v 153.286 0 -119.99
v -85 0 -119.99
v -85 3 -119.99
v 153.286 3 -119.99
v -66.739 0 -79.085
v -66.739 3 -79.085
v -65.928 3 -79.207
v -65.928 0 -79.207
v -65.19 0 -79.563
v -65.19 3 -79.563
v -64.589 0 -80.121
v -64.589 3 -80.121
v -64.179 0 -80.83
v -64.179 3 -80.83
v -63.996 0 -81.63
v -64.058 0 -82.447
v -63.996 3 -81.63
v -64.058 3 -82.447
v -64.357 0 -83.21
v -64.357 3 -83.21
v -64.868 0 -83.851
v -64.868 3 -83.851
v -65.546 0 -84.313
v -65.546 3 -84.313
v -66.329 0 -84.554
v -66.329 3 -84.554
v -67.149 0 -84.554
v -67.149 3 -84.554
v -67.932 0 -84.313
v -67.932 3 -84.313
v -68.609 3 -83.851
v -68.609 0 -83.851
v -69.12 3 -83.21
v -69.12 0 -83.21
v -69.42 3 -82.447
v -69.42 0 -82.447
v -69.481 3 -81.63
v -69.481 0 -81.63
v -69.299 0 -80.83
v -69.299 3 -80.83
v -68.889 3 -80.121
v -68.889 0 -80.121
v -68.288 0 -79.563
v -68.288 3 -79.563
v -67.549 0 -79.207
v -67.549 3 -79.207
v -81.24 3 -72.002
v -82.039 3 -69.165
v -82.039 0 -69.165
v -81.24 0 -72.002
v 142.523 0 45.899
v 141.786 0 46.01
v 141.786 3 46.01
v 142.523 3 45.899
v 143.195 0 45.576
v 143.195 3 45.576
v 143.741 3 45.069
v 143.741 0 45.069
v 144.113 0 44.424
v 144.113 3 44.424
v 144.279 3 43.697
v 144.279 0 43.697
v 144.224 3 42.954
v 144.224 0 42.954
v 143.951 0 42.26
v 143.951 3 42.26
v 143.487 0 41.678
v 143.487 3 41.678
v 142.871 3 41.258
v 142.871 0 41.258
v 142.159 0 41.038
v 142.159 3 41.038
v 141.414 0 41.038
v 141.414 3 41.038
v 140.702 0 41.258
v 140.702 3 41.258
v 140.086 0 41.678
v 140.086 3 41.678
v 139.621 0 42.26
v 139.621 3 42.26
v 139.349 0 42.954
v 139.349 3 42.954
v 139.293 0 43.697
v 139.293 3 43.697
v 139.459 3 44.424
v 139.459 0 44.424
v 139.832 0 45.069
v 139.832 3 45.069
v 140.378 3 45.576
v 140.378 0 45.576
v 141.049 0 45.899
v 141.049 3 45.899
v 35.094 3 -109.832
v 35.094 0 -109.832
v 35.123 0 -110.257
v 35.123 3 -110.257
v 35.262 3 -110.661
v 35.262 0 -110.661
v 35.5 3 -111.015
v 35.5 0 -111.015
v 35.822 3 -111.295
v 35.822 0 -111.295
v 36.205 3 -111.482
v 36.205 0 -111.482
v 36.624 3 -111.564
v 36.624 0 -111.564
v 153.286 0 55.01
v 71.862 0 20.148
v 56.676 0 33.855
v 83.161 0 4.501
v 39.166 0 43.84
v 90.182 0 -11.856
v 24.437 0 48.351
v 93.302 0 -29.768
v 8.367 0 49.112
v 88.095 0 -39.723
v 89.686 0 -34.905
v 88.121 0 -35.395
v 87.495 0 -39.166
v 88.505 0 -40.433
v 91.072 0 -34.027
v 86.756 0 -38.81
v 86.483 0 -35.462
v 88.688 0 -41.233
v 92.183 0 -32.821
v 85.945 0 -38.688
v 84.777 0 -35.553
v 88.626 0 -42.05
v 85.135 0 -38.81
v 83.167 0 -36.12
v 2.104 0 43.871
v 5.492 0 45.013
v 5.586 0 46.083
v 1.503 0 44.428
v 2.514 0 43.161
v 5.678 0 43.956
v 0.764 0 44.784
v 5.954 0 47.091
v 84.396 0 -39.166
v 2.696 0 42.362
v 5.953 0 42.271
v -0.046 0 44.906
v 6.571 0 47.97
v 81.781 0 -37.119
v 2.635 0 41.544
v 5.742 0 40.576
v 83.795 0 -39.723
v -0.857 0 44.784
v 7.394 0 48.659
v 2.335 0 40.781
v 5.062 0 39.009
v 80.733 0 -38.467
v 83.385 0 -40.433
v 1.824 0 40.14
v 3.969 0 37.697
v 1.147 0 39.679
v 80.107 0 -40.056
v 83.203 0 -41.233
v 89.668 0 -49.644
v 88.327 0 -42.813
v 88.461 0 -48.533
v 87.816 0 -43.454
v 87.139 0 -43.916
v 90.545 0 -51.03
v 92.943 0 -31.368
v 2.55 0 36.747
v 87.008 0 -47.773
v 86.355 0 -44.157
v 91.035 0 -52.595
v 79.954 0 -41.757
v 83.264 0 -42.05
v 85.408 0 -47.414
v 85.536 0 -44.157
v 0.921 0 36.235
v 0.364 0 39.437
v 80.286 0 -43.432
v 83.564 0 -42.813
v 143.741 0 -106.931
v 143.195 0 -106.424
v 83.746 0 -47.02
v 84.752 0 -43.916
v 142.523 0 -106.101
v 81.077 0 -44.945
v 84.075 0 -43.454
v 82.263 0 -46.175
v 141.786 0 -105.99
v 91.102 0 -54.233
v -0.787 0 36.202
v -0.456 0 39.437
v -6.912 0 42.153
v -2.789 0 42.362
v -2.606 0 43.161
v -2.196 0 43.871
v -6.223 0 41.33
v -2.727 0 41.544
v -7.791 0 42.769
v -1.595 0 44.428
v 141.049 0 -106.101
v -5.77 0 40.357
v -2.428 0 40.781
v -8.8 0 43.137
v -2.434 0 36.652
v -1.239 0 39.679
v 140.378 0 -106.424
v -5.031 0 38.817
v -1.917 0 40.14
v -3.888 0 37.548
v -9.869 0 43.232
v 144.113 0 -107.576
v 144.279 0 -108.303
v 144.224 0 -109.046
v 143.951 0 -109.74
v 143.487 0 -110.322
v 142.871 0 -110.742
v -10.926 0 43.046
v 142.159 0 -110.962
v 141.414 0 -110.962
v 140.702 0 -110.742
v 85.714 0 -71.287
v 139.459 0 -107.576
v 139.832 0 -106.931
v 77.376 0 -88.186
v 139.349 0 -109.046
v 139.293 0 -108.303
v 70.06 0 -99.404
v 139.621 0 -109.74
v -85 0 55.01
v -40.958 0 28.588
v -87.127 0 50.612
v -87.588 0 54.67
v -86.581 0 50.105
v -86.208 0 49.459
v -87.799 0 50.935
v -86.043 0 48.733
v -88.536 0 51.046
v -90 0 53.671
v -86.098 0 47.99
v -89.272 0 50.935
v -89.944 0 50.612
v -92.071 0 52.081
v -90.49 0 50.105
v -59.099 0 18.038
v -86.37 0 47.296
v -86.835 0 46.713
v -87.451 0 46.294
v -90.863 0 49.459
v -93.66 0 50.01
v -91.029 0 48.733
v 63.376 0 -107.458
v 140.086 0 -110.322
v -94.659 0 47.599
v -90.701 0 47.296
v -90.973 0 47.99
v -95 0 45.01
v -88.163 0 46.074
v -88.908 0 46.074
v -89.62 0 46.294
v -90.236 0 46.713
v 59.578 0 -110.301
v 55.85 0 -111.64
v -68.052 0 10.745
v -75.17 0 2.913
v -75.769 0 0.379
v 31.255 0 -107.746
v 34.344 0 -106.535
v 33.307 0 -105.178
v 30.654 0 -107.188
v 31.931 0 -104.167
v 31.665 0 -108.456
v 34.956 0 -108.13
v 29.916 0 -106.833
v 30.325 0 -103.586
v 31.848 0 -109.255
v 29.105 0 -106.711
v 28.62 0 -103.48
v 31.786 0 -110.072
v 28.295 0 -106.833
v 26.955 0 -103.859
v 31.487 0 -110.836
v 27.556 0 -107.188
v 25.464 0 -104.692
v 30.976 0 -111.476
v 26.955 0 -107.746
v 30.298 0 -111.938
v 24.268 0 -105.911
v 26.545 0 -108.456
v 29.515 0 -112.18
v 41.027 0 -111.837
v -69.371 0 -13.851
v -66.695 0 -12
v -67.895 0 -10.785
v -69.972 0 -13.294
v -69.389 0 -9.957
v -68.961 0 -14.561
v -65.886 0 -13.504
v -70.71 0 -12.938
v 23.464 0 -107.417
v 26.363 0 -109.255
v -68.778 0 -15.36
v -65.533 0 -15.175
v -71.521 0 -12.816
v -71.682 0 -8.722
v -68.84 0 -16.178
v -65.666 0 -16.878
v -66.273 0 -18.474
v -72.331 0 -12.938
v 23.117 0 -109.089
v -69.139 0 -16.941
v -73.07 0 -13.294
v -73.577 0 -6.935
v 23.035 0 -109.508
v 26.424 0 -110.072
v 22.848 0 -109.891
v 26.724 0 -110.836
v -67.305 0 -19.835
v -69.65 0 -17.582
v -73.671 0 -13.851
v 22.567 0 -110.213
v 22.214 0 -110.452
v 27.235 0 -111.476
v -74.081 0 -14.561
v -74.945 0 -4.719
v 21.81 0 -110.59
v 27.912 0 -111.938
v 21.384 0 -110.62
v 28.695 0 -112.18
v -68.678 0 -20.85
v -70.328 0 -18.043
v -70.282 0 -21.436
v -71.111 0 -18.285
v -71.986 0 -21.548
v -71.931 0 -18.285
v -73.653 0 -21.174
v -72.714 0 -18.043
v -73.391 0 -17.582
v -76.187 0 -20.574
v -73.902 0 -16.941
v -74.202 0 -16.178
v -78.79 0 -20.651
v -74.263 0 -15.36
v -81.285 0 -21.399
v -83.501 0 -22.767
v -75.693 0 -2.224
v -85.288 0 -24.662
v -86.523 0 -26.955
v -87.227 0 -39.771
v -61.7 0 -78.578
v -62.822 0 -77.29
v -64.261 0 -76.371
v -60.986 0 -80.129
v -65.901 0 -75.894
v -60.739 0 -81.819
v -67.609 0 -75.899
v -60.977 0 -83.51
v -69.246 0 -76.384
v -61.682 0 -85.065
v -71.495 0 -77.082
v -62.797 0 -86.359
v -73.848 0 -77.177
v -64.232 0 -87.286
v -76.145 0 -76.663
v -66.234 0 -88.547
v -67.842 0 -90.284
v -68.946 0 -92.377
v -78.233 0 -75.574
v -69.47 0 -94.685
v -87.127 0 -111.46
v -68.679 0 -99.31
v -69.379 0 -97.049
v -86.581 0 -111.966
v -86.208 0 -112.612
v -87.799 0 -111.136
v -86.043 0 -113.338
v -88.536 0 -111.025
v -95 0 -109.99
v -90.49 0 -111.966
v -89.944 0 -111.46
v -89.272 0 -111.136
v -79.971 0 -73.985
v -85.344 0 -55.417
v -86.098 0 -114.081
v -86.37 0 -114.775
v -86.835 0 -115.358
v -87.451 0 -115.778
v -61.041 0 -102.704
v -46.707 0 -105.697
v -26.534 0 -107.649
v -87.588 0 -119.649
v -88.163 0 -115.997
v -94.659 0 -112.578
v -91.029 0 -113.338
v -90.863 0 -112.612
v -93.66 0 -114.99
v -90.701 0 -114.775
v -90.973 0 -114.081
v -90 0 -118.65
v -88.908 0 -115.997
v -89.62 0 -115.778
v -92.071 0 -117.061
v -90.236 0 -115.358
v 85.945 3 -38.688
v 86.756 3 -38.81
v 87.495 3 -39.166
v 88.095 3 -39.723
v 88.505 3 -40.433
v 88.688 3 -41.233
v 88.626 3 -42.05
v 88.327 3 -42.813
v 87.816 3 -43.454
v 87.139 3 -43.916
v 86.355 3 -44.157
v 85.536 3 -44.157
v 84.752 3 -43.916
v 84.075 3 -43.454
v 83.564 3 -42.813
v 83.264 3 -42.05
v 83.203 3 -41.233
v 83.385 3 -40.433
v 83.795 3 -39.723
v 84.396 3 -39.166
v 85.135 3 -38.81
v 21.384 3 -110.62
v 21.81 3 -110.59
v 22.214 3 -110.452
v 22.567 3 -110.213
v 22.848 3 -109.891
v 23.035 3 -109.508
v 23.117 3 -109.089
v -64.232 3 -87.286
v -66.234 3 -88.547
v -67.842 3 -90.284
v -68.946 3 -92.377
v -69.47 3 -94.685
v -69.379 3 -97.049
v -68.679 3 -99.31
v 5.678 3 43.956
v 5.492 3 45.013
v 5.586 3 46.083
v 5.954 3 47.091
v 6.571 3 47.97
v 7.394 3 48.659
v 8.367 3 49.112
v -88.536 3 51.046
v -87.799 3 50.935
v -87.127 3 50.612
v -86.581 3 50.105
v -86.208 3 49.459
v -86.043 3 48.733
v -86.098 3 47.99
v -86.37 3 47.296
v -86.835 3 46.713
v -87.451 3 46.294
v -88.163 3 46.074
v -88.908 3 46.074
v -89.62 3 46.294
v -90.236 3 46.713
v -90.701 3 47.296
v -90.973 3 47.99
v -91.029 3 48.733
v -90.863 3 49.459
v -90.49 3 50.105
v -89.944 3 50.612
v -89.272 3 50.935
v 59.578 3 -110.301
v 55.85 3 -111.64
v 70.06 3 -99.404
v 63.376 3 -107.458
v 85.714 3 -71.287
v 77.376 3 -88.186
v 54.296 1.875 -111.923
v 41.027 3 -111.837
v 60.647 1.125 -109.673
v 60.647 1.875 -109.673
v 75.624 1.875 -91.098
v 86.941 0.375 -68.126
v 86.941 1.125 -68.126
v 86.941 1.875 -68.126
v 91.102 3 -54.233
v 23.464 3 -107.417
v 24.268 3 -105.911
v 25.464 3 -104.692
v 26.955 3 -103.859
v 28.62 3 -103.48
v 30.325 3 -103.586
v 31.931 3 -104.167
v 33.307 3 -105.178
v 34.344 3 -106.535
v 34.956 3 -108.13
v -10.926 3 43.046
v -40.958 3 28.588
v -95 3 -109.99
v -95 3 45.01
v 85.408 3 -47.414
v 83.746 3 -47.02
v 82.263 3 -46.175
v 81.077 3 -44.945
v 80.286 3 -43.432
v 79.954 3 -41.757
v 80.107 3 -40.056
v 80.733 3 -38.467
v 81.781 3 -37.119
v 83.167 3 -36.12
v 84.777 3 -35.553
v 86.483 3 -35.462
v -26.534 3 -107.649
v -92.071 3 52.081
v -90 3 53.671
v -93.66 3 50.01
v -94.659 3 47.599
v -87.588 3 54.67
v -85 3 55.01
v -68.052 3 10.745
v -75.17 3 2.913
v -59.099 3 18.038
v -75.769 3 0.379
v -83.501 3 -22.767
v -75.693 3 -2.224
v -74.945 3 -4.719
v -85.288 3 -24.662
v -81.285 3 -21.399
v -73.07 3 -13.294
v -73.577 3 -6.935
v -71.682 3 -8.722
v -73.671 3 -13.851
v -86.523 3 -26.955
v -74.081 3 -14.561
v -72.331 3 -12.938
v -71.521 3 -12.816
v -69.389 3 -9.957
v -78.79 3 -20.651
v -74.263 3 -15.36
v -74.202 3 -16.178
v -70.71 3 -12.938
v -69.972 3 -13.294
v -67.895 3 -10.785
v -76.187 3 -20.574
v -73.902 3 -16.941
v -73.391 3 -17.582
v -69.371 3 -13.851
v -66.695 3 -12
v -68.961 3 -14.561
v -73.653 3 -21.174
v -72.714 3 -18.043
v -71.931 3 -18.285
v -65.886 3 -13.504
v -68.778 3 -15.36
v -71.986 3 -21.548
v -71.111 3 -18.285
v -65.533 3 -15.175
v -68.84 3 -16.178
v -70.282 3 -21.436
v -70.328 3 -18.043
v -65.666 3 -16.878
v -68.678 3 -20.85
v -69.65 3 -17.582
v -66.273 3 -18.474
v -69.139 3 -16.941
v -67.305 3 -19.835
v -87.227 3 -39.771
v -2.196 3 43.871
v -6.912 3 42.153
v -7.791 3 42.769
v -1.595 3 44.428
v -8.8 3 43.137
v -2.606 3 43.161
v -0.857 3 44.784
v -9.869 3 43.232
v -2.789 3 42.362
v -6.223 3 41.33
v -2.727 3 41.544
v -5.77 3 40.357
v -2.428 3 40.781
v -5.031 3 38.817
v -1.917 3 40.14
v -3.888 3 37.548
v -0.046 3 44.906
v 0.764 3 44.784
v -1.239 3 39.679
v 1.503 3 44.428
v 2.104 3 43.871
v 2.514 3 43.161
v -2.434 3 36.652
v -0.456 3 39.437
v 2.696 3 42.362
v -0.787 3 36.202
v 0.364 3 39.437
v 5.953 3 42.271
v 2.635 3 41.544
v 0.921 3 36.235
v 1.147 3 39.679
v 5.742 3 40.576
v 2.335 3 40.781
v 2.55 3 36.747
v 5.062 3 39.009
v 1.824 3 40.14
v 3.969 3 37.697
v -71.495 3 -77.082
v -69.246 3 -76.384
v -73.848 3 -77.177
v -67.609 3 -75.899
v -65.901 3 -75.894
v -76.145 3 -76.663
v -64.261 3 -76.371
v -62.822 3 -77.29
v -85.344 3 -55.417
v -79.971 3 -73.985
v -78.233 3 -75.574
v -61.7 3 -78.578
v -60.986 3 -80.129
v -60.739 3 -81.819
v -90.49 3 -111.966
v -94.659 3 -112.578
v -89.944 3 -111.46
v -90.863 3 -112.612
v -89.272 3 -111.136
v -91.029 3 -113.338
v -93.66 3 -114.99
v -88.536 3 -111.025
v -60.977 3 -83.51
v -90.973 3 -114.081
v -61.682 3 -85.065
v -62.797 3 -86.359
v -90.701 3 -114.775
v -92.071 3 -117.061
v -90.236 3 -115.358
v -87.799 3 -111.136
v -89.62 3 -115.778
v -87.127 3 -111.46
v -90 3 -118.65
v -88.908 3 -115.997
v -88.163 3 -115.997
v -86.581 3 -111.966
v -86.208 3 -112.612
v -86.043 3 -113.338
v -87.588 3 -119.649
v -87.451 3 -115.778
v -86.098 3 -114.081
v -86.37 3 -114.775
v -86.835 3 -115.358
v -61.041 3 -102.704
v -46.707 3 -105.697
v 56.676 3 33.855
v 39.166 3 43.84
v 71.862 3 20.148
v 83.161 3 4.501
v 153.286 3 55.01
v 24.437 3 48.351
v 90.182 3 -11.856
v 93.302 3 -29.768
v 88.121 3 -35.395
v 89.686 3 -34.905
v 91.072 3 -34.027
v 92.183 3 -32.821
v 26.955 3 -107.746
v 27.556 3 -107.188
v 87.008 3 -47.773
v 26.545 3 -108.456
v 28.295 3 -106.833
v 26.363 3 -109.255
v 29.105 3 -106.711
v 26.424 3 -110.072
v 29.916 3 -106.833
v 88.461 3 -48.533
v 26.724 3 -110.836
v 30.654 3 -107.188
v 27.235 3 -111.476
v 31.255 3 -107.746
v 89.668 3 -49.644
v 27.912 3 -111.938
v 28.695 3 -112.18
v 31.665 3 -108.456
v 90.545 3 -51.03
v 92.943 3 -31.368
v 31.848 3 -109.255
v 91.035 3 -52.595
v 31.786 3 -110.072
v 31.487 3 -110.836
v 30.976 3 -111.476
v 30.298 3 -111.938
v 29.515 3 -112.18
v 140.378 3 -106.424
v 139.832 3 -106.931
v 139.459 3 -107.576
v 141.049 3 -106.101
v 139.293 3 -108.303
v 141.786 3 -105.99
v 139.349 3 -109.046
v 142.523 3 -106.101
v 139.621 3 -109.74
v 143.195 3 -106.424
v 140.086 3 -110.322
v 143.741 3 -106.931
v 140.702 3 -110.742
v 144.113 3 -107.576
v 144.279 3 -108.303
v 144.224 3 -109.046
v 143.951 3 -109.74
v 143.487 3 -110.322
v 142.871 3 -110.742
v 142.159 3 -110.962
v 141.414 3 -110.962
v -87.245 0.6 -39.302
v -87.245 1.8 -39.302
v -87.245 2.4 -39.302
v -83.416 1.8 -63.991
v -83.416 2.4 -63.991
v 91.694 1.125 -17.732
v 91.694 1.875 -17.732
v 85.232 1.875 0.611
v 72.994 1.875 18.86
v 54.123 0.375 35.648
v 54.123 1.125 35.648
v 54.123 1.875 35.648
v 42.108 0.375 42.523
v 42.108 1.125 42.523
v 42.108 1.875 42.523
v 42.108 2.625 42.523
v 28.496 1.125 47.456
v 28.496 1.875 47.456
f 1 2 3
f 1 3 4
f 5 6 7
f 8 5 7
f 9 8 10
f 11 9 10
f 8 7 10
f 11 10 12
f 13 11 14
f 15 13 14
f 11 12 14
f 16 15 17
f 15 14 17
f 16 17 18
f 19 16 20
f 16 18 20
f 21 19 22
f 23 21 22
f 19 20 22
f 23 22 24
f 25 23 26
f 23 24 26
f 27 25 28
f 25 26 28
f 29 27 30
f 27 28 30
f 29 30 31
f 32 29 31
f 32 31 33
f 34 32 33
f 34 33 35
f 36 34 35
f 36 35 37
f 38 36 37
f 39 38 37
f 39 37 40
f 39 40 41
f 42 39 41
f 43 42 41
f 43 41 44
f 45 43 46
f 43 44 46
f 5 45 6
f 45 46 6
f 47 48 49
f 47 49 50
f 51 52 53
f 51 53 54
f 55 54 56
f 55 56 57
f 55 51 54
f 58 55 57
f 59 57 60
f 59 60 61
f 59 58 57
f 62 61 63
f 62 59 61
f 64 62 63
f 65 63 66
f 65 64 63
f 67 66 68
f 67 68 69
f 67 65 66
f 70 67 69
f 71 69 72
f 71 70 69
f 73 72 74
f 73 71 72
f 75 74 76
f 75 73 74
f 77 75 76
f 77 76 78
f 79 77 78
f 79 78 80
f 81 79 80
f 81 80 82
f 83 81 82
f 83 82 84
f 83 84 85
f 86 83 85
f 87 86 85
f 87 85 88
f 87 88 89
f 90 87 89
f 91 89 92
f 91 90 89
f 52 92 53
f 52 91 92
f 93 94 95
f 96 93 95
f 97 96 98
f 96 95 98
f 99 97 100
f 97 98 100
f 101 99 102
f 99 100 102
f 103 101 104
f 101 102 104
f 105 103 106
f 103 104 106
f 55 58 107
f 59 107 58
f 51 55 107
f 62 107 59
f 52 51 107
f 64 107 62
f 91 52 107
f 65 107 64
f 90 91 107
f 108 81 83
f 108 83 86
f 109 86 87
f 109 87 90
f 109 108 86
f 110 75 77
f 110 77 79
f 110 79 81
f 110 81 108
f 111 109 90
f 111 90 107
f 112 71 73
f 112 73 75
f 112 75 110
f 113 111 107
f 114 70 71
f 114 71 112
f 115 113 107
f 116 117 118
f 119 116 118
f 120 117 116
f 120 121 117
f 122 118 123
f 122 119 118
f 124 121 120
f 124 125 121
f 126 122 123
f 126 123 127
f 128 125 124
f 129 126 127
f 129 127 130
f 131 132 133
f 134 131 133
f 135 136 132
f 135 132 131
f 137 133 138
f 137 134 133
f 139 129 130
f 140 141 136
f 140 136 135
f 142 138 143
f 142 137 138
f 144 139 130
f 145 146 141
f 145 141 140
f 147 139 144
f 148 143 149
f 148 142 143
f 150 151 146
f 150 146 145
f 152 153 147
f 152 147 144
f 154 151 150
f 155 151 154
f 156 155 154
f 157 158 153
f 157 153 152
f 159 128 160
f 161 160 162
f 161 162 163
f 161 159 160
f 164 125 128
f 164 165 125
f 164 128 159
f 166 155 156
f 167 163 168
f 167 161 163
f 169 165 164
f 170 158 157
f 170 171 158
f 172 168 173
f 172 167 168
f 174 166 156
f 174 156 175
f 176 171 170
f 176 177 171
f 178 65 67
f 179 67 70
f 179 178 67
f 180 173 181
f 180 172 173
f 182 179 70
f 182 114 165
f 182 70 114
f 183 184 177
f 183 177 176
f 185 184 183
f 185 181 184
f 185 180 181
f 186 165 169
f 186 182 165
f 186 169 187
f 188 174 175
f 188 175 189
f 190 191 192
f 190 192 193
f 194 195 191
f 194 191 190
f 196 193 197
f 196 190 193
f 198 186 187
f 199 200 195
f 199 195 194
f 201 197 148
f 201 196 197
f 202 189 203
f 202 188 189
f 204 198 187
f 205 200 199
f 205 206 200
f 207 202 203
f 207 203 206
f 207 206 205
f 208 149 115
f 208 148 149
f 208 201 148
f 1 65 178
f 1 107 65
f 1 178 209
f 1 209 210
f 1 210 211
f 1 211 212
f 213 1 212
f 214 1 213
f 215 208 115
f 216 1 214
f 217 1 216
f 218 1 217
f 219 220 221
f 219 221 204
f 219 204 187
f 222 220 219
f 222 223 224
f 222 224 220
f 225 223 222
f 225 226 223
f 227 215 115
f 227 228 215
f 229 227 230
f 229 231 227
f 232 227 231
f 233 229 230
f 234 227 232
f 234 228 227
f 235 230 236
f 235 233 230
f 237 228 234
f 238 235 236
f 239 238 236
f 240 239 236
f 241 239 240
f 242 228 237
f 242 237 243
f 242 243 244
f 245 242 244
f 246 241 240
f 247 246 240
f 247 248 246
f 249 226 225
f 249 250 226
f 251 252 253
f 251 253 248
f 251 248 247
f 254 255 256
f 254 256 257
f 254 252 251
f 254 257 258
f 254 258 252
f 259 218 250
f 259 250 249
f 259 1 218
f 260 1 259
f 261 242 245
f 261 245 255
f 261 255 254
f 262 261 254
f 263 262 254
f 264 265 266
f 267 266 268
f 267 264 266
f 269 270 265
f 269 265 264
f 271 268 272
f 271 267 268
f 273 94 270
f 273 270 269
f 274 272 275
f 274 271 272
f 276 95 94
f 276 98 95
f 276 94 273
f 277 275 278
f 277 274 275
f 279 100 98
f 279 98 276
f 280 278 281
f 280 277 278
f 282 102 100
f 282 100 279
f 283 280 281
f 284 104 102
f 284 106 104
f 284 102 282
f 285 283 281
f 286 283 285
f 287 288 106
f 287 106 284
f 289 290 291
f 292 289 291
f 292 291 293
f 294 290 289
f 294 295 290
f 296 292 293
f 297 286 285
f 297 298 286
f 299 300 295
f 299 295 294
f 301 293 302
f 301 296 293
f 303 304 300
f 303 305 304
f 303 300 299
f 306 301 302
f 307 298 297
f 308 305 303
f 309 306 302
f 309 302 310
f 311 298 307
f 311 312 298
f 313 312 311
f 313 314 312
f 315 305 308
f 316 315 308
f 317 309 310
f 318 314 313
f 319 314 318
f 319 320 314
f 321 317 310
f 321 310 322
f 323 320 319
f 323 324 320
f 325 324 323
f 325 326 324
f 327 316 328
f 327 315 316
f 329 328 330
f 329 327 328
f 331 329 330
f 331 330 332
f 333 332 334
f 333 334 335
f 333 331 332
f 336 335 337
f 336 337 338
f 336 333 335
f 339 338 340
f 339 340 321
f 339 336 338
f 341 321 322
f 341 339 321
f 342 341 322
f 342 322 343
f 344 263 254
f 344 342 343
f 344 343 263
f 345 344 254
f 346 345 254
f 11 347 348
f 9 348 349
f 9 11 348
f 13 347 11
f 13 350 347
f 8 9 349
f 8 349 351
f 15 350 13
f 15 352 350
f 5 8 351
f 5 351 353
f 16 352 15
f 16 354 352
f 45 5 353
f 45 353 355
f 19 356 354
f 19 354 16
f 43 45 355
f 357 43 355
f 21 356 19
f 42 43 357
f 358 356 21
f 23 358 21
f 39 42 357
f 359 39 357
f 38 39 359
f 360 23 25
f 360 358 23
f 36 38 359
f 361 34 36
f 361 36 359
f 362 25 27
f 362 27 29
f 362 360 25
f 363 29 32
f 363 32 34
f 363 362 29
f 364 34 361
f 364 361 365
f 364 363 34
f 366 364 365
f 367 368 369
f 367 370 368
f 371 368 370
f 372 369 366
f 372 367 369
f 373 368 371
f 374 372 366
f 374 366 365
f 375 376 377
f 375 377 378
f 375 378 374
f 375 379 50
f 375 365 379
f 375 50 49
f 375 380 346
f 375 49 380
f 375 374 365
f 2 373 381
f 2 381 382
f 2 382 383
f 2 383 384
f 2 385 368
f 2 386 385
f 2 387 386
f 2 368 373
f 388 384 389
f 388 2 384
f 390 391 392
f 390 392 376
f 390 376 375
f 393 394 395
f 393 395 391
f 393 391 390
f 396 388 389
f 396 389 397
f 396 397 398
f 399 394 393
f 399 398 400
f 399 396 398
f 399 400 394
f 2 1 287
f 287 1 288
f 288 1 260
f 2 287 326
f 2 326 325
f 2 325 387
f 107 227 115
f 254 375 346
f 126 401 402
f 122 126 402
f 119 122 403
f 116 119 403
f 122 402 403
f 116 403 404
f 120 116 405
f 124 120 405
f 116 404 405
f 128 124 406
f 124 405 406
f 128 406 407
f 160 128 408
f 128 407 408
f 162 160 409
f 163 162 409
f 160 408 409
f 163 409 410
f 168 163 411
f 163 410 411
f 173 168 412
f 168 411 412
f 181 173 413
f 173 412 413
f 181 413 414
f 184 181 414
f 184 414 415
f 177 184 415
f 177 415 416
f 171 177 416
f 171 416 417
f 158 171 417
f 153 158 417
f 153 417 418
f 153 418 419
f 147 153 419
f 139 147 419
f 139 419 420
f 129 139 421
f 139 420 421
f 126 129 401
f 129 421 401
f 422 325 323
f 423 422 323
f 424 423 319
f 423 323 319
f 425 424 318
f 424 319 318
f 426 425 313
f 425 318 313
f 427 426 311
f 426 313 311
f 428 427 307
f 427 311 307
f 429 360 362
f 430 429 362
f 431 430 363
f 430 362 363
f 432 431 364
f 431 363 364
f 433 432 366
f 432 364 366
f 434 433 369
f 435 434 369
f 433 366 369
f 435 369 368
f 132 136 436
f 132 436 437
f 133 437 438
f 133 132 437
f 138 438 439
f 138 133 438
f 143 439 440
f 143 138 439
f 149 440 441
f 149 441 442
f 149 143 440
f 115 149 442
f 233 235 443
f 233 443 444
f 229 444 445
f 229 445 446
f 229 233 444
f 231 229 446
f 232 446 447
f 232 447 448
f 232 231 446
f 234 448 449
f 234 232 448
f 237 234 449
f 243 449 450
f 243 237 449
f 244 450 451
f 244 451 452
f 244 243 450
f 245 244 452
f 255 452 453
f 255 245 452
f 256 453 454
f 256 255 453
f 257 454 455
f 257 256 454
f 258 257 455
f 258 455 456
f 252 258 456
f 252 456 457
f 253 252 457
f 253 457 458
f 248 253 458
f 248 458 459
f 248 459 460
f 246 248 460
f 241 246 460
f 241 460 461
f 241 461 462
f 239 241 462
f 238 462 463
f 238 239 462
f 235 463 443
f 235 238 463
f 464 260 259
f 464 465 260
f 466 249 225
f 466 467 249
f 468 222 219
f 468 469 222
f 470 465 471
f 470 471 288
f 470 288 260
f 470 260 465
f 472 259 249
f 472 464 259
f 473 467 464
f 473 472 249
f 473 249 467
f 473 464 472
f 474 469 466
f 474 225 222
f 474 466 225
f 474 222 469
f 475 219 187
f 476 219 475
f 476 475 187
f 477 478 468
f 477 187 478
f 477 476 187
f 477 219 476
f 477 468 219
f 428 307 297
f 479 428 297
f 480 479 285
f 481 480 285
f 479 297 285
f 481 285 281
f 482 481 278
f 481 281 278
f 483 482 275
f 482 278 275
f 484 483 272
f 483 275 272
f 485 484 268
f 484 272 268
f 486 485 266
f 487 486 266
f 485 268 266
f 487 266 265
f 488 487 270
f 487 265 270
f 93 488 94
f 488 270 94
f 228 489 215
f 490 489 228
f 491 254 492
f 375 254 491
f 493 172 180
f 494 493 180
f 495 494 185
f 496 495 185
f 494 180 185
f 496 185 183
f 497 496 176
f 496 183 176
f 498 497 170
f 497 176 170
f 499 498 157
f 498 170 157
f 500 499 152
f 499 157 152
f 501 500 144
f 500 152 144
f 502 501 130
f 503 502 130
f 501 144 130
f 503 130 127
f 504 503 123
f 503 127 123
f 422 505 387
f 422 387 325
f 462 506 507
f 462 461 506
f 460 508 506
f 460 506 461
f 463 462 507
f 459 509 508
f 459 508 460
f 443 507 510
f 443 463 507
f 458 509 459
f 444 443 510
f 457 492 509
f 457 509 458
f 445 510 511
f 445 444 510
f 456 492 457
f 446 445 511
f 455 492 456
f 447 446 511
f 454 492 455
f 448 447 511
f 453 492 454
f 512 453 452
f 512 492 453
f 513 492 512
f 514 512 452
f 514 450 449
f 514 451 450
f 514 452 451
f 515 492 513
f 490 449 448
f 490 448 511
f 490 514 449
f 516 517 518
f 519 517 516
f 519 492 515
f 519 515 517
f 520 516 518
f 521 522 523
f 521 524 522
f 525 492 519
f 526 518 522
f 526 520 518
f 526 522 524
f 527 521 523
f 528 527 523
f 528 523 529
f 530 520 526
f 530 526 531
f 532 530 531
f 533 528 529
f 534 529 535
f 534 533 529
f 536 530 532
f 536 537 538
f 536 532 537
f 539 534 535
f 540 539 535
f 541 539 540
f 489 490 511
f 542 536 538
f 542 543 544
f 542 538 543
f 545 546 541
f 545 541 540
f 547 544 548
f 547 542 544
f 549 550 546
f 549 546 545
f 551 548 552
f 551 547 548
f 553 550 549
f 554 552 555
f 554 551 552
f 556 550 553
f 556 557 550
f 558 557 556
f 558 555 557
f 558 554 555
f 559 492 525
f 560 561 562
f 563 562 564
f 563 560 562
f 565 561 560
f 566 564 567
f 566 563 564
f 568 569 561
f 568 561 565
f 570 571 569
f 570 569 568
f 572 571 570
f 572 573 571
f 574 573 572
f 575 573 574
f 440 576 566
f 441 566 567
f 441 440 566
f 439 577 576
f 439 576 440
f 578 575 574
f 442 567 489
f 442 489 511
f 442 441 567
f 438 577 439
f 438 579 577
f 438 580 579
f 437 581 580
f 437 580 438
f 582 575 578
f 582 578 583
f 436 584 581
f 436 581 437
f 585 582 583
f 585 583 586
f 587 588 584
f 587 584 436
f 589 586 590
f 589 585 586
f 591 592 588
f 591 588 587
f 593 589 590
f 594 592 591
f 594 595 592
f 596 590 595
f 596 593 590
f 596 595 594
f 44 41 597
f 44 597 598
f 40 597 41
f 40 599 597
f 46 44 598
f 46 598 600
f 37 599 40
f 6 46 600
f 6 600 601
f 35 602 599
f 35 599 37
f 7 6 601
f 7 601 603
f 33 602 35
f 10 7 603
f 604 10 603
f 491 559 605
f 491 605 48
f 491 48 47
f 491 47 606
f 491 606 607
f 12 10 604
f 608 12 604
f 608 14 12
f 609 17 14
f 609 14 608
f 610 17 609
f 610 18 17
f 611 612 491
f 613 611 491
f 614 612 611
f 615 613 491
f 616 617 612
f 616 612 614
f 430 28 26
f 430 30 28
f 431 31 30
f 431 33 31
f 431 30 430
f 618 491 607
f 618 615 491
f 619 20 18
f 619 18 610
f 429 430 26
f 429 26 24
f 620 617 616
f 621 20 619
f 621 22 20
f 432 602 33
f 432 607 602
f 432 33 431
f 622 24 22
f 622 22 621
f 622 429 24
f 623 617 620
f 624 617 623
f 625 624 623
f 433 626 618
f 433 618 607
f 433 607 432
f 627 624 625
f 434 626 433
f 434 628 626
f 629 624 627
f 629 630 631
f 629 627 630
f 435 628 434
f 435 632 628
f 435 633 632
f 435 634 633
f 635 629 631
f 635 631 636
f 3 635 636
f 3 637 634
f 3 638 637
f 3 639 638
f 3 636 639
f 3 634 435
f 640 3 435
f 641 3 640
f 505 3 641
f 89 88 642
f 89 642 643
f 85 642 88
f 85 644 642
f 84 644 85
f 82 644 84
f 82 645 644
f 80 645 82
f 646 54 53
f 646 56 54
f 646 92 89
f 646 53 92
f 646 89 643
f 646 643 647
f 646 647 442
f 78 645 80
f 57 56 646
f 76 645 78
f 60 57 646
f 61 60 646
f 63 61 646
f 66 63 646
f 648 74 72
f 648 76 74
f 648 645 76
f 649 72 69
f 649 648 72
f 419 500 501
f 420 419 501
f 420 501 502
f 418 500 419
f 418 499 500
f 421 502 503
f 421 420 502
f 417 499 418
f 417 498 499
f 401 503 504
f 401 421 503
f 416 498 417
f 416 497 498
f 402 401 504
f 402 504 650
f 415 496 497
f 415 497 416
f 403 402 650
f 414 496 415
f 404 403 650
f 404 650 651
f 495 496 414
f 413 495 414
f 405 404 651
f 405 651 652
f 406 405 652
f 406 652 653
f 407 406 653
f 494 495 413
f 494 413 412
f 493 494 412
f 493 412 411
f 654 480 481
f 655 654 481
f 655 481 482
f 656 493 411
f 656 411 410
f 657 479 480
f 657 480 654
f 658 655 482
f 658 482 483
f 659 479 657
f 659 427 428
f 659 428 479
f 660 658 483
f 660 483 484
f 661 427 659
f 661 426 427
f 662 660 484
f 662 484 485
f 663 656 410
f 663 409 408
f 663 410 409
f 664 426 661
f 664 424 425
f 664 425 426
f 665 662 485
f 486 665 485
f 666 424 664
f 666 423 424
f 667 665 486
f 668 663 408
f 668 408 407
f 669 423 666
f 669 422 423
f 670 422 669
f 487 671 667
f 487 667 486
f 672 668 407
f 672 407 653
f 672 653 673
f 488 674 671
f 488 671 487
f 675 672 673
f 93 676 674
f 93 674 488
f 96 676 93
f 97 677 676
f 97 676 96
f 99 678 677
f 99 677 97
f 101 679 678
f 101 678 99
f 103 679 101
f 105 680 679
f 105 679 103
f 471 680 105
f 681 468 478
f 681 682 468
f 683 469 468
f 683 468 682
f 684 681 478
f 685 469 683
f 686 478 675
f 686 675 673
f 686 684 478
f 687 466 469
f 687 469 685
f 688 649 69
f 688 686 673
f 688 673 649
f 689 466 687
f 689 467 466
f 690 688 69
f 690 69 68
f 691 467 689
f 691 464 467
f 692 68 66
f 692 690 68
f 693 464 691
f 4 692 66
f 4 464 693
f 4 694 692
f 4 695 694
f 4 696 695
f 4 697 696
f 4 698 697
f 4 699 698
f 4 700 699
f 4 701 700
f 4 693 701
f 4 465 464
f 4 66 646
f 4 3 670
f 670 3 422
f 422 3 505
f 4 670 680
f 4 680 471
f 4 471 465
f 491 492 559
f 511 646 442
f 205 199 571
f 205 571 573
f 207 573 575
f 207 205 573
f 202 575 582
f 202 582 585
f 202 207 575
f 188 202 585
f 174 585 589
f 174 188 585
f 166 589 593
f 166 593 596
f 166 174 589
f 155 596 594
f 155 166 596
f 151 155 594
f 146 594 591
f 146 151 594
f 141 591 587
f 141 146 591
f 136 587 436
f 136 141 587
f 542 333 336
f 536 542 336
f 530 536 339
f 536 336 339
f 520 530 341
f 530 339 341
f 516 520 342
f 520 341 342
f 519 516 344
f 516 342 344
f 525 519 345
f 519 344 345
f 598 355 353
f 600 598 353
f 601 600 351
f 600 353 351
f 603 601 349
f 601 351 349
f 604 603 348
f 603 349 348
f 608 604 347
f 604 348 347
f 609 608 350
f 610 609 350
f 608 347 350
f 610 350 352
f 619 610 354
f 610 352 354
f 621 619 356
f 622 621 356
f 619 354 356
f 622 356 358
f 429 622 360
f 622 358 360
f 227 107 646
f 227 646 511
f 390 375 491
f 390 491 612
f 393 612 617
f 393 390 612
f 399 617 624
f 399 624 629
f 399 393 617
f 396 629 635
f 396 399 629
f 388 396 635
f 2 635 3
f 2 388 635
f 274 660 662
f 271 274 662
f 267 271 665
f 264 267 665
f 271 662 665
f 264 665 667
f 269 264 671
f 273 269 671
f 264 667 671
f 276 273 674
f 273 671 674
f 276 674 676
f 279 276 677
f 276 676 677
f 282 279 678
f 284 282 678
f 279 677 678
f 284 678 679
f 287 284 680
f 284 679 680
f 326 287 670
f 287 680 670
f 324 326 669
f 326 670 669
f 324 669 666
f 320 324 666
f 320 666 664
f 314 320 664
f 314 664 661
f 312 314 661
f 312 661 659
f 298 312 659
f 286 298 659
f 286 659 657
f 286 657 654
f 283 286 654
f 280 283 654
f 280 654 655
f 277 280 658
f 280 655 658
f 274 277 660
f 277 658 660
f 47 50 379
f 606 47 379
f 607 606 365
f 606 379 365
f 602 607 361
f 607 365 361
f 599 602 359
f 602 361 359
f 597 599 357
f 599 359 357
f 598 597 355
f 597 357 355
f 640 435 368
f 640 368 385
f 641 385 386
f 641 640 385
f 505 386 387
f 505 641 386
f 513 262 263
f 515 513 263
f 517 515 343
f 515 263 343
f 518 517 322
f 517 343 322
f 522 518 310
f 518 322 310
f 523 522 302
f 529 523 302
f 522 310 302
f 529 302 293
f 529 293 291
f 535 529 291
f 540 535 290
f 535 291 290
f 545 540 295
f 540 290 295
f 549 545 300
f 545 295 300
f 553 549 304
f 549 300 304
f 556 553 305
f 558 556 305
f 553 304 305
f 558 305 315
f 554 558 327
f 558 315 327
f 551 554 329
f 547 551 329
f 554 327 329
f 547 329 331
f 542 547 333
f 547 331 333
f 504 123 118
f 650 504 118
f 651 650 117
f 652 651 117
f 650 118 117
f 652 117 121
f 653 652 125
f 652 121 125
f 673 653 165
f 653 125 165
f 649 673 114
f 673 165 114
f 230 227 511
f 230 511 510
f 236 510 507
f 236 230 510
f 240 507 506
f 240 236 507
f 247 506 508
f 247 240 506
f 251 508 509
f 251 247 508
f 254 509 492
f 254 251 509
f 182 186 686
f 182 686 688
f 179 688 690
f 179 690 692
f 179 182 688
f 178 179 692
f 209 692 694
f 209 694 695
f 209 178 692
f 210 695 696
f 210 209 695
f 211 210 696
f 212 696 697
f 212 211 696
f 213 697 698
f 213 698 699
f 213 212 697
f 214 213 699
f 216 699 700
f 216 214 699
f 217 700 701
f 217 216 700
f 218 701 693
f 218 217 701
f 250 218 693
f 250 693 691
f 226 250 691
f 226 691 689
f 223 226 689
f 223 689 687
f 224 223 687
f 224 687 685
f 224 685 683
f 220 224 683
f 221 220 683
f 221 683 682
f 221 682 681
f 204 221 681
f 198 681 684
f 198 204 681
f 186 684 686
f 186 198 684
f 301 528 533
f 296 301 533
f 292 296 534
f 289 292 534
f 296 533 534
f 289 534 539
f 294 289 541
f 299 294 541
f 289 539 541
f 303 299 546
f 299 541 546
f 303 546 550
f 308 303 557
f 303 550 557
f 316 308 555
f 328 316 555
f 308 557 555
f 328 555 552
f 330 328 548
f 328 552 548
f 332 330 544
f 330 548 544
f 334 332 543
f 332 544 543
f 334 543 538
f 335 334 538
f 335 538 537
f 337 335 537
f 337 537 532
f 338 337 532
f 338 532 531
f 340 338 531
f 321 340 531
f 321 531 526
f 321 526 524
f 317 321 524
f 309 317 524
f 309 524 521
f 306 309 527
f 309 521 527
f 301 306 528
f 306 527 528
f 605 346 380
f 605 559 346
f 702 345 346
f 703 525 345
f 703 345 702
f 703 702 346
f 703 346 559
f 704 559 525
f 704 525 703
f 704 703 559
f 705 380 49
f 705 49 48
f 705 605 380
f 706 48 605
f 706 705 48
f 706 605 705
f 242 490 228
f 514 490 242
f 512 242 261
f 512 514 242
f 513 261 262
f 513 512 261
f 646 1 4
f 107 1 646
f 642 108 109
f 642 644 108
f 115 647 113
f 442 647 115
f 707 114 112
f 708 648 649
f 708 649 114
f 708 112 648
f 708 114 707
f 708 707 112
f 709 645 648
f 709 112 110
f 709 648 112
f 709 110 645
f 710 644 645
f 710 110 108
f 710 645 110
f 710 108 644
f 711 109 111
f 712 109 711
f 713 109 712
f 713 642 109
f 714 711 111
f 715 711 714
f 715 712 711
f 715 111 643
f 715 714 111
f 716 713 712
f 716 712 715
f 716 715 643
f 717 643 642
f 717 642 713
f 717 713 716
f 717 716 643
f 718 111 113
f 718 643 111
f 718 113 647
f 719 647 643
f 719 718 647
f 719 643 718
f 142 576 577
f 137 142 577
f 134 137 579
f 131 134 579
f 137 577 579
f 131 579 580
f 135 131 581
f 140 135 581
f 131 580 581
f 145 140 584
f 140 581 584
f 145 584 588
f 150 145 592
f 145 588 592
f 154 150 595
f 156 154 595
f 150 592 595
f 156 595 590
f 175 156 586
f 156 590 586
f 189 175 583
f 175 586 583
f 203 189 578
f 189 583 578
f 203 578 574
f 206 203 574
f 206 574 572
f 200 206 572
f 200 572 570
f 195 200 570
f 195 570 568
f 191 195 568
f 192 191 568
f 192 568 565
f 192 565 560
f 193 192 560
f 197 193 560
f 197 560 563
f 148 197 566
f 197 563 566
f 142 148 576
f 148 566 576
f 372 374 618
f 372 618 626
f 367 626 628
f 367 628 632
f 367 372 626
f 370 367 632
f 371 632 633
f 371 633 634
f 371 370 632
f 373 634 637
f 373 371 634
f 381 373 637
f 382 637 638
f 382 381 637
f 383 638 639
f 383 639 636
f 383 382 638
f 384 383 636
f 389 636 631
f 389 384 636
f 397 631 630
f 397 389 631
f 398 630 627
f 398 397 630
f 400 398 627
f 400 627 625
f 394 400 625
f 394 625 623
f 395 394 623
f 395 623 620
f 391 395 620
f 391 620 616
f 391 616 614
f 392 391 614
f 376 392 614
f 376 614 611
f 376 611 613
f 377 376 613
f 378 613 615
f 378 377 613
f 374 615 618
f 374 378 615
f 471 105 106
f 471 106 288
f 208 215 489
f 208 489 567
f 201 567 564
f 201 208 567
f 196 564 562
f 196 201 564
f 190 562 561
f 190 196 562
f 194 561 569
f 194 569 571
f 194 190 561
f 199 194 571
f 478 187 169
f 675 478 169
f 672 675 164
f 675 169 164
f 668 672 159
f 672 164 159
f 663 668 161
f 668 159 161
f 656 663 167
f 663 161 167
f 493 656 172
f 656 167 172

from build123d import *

# Parameters (mm, degrees)
ESQUISSE1_R         = 2.5
BOSS_EXTRU_1_DEPTH  = 3
CUT_EXTRUDE1_START  = -3
CUT_EXTRUDE1_DEPTH  = 3
BOSS_EXTRUDE1_DEPTH = 3
SKETCH1_R           = 2.75
CUT_EXTRUDE2_DEPTH  = 3


# Read off the part's stored shape, not the designer's step: Cut-Extrude1
with BuildPart() as part:
    # Esquisse1 → Boss.-Extru.1 (new body)
    with BuildSketch(Plane(origin=(0, 0, 0), x_dir=(1, 0, 0), z_dir=(0, 1, 0))):
        with BuildLine():
            Line((-85, 119.989574584), (153.28624341, 119.989574584))
            Line((153.28624341, 119.989574584), (153.28624341, -55.010425416))
            Line((153.28624341, -55.010425416), (-85, -55.010425416))
            ThreePointArc((-85, -55.010425416), (-92.071067812, -52.081493228), (-95, -45.010425416))
            Line((-95, -45.010425416), (-95, 109.989574584))
            ThreePointArc((-95, 109.989574584), (-92.071067812, 117.060642396), (-85, 119.989574584))
        make_face()
        with Locations(Location((141.78624341, -43.510425416, 0), (0, 0, 270))):
            Circle(ESQUISSE1_R, mode=Mode.SUBTRACT)
        with Locations(Location((141.78624341, 108.489574584, 0), (0, 0, 270))):
            Circle(ESQUISSE1_R, mode=Mode.SUBTRACT)
        with Locations(Location((-88.535533906, 113.52510849, 0), (0, 0, 270))):
            Circle(ESQUISSE1_R, mode=Mode.SUBTRACT)
        with Locations(Location((-88.535533906, -48.545959322, 0), (0, 0, 270))):
            Circle(ESQUISSE1_R, mode=Mode.SUBTRACT)
    extrude(amount=BOSS_EXTRU_1_DEPTH)

    # Cut-Extrude1 outline → Cut-Extrude1 (cut)
    with BuildSketch(Plane.XZ.offset(CUT_EXTRUDE1_START)):
        with BuildLine():
            Line((-26.534089411, -107.649444077), (41.026883272, -111.837107673))
            add(Edge.make_bspline(
                [(41.026883272, -111.837107673), (80.871896507, -115.445570806), (43.6868837, -98.824618367), (93.841601725, -105.501811245), (103.459361301, -42.407292201), (100.29035903, -19.379375914), (109.081082927, -3.387830236), (48.623008548, 72.204101039), (-7.977504863, 44.465677035)],
                knots=[0, 0, 0, 0, 0, 0, 0, 0, 0, 1, 1, 1, 1, 1, 1, 1, 1, 1], degree=8))
            Line((-7.977504863, 44.465677035), (-40.958080323, 28.587571847))
            add(Edge.make_bspline(
                [(-40.958080323, 28.587571847), (-63.284478038, 17.843514847), (-77.245184412, 4.644427122), (-85.775449686, -19.222136636), (-87.563403654, -31.078889142), (-86.988969289, -45.934210012), (-86.496578535, -48.869280426), (-84.771877477, -58.734159705), (-84.595340706, -59.308431064), (-82.980639435, -65.721995035), (-82.521559893, -67.446566753), (-82.039157422, -69.164892884)],
                knots=[0, 0, 0, 0, 1, 1, 1.52461883, 1.52461883, 1.947694096, 1.947694096, 2.583008028, 2.583008028, 2.817830116, 2.817830116, 2.817830116, 2.817830116], degree=3))
            add(Edge.make_bspline(
                [(-82.039157422, -69.164892884), (-78.230073131, -83.238962063), (-67.06916766, -105.136939227), (-26.534089411, -107.649444077)],
                knots=[0, 0, 0, 1, 1.688392895, 1.688392895, 1.688392895], degree=2))
        make_face()
    extrude(amount=CUT_EXTRUDE1_DEPTH, mode=Mode.SUBTRACT)

    # Sketch4 → Boss-Extrude1 (add)
    with BuildSketch(Plane(origin=(0, 0, 0), x_dir=(1, 0, 0), z_dir=(0, 1, 0))):
        with BuildLine():
            Line((93.302020541, 29.767829549), (97.480208944, 29.767829549))
            Line((97.480208944, 29.767829549), (95.391114743, 55.173684352))
            Line((95.391114743, 55.173684352), (91.102425061, 54.233284915))
            ThreePointArc((91.102425061, 54.233284915), (89.667608862, 49.644276713), (85.408121779, 47.41392616))
            ThreePointArc((85.408121779, 47.41392616), (79.969495118, 40.900759492), (86.482661786, 35.462132831))
            ThreePointArc((86.482661786, 35.462132831), (91.071669987, 34.027316631), (93.302020541, 29.767829549))
        make_face()
        with BuildLine():
            Line((36.624084675, 111.564206934), (36.331188094, 116.289605103))
            Line((36.331188094, 116.289605103), (21.485435183, 115.369413807))
            Line((21.485435183, 115.369413807), (21.384316793, 110.619593222))
            ThreePointArc((21.384316793, 110.619593222), (22.567491202, 110.213275552), (23.116811871, 109.089334924))
            ThreePointArc((23.116811871, 109.089334924), (29.47650759, 103.472016137), (35.093826377, 109.831711857))
            ThreePointArc((35.093826377, 109.831711857), (35.500144047, 111.014886266), (36.624084675, 111.564206934))
        make_face()
        with BuildLine():
            Line((-68.679115078, 99.310003258), (-77.197650928, 103.460523399))
            Line((-77.197650928, 103.460523399), (-90.092844695, 74.888102234))
            Line((-90.092844695, 74.888102234), (-81.269930428, 71.936494141))
            ThreePointArc((-81.269930428, 71.936494141), (-76.179120901, 76.650519158), (-69.246055906, 76.384092275))
            ThreePointArc((-69.246055906, 76.384092275), (-61.287768194, 79.327841024), (-64.231516944, 87.286128736))
            ThreePointArc((-64.231516944, 87.286128736), (-68.94554196, 92.376938263), (-68.679115078, 99.310003258))
        make_face()
        with BuildLine():
            Line((-86.523393512, 26.954917178), (-90.889130919, 29.767829549))
            Line((-90.889130919, 29.767829549), (-75.16950367, -12.427072891))
            Line((-75.16950367, -12.427072891), (-75.16950367, -2.91348489))
            ThreePointArc((-75.16950367, -2.91348489), (-74.944749705, 4.719117072), (-69.388760046, 9.957256624))
            ThreePointArc((-69.388760046, 9.957256624), (-65.912247557, 17.697661065), (-73.652651998, 21.174173554))
            ThreePointArc((-73.652651998, 21.174173554), (-81.28525396, 21.39892752), (-86.523393512, 26.954917178))
        make_face()
        with BuildLine():
            Line((8.366944085, -49.112206716), (11.747056213, -51.290065422))
            Line((11.747056213, -51.290065422), (-16.208470261, -45.189381197))
            Line((-16.208470261, -45.189381197), (-10.926193077, -43.04606622))
            ThreePointArc((-10.926193077, -43.04606622), (-7.791078178, -42.76925209), (-5.769954322, -40.356653937))
            ThreePointArc((-5.769954322, -40.356653937), (1.753445752, -36.432567887), (5.677531802, -43.955967961))
            ThreePointArc((5.677531802, -43.955967961), (5.954345932, -47.09108286), (8.366944085, -49.112206716))
        make_face()
    extrude(amount=BOSS_EXTRUDE1_DEPTH)

    # Sketch1 → Cut-Extrude2 (cut)
    with BuildSketch(Plane(origin=(0, 3, 0), x_dir=(1, 0, 0), z_dir=(0, 1, 0))):
        with Locations(Location((29.105319124, 109.46052339, 0), (0, 0, 270))):
            Circle(SKETCH1_R)
        with Locations(Location((85.945391782, 41.438029495, 0), (0, 0, 270))):
            Circle(SKETCH1_R)
        with Locations(Location((-0.04621126, -42.156310949, 0), (0, 0, 270))):
            Circle(SKETCH1_R)
        with Locations(Location((-66.738786425, 81.835110506, 0), (0, 0, 270))):
            Circle(SKETCH1_R)
        with Locations(Location((-71.520706022, 15.565715089, 0), (0, 0, 270))):
            Circle(SKETCH1_R)
    extrude(amount=-CUT_EXTRUDE2_DEPTH, mode=Mode.SUBTRACT)


solid = part.part
